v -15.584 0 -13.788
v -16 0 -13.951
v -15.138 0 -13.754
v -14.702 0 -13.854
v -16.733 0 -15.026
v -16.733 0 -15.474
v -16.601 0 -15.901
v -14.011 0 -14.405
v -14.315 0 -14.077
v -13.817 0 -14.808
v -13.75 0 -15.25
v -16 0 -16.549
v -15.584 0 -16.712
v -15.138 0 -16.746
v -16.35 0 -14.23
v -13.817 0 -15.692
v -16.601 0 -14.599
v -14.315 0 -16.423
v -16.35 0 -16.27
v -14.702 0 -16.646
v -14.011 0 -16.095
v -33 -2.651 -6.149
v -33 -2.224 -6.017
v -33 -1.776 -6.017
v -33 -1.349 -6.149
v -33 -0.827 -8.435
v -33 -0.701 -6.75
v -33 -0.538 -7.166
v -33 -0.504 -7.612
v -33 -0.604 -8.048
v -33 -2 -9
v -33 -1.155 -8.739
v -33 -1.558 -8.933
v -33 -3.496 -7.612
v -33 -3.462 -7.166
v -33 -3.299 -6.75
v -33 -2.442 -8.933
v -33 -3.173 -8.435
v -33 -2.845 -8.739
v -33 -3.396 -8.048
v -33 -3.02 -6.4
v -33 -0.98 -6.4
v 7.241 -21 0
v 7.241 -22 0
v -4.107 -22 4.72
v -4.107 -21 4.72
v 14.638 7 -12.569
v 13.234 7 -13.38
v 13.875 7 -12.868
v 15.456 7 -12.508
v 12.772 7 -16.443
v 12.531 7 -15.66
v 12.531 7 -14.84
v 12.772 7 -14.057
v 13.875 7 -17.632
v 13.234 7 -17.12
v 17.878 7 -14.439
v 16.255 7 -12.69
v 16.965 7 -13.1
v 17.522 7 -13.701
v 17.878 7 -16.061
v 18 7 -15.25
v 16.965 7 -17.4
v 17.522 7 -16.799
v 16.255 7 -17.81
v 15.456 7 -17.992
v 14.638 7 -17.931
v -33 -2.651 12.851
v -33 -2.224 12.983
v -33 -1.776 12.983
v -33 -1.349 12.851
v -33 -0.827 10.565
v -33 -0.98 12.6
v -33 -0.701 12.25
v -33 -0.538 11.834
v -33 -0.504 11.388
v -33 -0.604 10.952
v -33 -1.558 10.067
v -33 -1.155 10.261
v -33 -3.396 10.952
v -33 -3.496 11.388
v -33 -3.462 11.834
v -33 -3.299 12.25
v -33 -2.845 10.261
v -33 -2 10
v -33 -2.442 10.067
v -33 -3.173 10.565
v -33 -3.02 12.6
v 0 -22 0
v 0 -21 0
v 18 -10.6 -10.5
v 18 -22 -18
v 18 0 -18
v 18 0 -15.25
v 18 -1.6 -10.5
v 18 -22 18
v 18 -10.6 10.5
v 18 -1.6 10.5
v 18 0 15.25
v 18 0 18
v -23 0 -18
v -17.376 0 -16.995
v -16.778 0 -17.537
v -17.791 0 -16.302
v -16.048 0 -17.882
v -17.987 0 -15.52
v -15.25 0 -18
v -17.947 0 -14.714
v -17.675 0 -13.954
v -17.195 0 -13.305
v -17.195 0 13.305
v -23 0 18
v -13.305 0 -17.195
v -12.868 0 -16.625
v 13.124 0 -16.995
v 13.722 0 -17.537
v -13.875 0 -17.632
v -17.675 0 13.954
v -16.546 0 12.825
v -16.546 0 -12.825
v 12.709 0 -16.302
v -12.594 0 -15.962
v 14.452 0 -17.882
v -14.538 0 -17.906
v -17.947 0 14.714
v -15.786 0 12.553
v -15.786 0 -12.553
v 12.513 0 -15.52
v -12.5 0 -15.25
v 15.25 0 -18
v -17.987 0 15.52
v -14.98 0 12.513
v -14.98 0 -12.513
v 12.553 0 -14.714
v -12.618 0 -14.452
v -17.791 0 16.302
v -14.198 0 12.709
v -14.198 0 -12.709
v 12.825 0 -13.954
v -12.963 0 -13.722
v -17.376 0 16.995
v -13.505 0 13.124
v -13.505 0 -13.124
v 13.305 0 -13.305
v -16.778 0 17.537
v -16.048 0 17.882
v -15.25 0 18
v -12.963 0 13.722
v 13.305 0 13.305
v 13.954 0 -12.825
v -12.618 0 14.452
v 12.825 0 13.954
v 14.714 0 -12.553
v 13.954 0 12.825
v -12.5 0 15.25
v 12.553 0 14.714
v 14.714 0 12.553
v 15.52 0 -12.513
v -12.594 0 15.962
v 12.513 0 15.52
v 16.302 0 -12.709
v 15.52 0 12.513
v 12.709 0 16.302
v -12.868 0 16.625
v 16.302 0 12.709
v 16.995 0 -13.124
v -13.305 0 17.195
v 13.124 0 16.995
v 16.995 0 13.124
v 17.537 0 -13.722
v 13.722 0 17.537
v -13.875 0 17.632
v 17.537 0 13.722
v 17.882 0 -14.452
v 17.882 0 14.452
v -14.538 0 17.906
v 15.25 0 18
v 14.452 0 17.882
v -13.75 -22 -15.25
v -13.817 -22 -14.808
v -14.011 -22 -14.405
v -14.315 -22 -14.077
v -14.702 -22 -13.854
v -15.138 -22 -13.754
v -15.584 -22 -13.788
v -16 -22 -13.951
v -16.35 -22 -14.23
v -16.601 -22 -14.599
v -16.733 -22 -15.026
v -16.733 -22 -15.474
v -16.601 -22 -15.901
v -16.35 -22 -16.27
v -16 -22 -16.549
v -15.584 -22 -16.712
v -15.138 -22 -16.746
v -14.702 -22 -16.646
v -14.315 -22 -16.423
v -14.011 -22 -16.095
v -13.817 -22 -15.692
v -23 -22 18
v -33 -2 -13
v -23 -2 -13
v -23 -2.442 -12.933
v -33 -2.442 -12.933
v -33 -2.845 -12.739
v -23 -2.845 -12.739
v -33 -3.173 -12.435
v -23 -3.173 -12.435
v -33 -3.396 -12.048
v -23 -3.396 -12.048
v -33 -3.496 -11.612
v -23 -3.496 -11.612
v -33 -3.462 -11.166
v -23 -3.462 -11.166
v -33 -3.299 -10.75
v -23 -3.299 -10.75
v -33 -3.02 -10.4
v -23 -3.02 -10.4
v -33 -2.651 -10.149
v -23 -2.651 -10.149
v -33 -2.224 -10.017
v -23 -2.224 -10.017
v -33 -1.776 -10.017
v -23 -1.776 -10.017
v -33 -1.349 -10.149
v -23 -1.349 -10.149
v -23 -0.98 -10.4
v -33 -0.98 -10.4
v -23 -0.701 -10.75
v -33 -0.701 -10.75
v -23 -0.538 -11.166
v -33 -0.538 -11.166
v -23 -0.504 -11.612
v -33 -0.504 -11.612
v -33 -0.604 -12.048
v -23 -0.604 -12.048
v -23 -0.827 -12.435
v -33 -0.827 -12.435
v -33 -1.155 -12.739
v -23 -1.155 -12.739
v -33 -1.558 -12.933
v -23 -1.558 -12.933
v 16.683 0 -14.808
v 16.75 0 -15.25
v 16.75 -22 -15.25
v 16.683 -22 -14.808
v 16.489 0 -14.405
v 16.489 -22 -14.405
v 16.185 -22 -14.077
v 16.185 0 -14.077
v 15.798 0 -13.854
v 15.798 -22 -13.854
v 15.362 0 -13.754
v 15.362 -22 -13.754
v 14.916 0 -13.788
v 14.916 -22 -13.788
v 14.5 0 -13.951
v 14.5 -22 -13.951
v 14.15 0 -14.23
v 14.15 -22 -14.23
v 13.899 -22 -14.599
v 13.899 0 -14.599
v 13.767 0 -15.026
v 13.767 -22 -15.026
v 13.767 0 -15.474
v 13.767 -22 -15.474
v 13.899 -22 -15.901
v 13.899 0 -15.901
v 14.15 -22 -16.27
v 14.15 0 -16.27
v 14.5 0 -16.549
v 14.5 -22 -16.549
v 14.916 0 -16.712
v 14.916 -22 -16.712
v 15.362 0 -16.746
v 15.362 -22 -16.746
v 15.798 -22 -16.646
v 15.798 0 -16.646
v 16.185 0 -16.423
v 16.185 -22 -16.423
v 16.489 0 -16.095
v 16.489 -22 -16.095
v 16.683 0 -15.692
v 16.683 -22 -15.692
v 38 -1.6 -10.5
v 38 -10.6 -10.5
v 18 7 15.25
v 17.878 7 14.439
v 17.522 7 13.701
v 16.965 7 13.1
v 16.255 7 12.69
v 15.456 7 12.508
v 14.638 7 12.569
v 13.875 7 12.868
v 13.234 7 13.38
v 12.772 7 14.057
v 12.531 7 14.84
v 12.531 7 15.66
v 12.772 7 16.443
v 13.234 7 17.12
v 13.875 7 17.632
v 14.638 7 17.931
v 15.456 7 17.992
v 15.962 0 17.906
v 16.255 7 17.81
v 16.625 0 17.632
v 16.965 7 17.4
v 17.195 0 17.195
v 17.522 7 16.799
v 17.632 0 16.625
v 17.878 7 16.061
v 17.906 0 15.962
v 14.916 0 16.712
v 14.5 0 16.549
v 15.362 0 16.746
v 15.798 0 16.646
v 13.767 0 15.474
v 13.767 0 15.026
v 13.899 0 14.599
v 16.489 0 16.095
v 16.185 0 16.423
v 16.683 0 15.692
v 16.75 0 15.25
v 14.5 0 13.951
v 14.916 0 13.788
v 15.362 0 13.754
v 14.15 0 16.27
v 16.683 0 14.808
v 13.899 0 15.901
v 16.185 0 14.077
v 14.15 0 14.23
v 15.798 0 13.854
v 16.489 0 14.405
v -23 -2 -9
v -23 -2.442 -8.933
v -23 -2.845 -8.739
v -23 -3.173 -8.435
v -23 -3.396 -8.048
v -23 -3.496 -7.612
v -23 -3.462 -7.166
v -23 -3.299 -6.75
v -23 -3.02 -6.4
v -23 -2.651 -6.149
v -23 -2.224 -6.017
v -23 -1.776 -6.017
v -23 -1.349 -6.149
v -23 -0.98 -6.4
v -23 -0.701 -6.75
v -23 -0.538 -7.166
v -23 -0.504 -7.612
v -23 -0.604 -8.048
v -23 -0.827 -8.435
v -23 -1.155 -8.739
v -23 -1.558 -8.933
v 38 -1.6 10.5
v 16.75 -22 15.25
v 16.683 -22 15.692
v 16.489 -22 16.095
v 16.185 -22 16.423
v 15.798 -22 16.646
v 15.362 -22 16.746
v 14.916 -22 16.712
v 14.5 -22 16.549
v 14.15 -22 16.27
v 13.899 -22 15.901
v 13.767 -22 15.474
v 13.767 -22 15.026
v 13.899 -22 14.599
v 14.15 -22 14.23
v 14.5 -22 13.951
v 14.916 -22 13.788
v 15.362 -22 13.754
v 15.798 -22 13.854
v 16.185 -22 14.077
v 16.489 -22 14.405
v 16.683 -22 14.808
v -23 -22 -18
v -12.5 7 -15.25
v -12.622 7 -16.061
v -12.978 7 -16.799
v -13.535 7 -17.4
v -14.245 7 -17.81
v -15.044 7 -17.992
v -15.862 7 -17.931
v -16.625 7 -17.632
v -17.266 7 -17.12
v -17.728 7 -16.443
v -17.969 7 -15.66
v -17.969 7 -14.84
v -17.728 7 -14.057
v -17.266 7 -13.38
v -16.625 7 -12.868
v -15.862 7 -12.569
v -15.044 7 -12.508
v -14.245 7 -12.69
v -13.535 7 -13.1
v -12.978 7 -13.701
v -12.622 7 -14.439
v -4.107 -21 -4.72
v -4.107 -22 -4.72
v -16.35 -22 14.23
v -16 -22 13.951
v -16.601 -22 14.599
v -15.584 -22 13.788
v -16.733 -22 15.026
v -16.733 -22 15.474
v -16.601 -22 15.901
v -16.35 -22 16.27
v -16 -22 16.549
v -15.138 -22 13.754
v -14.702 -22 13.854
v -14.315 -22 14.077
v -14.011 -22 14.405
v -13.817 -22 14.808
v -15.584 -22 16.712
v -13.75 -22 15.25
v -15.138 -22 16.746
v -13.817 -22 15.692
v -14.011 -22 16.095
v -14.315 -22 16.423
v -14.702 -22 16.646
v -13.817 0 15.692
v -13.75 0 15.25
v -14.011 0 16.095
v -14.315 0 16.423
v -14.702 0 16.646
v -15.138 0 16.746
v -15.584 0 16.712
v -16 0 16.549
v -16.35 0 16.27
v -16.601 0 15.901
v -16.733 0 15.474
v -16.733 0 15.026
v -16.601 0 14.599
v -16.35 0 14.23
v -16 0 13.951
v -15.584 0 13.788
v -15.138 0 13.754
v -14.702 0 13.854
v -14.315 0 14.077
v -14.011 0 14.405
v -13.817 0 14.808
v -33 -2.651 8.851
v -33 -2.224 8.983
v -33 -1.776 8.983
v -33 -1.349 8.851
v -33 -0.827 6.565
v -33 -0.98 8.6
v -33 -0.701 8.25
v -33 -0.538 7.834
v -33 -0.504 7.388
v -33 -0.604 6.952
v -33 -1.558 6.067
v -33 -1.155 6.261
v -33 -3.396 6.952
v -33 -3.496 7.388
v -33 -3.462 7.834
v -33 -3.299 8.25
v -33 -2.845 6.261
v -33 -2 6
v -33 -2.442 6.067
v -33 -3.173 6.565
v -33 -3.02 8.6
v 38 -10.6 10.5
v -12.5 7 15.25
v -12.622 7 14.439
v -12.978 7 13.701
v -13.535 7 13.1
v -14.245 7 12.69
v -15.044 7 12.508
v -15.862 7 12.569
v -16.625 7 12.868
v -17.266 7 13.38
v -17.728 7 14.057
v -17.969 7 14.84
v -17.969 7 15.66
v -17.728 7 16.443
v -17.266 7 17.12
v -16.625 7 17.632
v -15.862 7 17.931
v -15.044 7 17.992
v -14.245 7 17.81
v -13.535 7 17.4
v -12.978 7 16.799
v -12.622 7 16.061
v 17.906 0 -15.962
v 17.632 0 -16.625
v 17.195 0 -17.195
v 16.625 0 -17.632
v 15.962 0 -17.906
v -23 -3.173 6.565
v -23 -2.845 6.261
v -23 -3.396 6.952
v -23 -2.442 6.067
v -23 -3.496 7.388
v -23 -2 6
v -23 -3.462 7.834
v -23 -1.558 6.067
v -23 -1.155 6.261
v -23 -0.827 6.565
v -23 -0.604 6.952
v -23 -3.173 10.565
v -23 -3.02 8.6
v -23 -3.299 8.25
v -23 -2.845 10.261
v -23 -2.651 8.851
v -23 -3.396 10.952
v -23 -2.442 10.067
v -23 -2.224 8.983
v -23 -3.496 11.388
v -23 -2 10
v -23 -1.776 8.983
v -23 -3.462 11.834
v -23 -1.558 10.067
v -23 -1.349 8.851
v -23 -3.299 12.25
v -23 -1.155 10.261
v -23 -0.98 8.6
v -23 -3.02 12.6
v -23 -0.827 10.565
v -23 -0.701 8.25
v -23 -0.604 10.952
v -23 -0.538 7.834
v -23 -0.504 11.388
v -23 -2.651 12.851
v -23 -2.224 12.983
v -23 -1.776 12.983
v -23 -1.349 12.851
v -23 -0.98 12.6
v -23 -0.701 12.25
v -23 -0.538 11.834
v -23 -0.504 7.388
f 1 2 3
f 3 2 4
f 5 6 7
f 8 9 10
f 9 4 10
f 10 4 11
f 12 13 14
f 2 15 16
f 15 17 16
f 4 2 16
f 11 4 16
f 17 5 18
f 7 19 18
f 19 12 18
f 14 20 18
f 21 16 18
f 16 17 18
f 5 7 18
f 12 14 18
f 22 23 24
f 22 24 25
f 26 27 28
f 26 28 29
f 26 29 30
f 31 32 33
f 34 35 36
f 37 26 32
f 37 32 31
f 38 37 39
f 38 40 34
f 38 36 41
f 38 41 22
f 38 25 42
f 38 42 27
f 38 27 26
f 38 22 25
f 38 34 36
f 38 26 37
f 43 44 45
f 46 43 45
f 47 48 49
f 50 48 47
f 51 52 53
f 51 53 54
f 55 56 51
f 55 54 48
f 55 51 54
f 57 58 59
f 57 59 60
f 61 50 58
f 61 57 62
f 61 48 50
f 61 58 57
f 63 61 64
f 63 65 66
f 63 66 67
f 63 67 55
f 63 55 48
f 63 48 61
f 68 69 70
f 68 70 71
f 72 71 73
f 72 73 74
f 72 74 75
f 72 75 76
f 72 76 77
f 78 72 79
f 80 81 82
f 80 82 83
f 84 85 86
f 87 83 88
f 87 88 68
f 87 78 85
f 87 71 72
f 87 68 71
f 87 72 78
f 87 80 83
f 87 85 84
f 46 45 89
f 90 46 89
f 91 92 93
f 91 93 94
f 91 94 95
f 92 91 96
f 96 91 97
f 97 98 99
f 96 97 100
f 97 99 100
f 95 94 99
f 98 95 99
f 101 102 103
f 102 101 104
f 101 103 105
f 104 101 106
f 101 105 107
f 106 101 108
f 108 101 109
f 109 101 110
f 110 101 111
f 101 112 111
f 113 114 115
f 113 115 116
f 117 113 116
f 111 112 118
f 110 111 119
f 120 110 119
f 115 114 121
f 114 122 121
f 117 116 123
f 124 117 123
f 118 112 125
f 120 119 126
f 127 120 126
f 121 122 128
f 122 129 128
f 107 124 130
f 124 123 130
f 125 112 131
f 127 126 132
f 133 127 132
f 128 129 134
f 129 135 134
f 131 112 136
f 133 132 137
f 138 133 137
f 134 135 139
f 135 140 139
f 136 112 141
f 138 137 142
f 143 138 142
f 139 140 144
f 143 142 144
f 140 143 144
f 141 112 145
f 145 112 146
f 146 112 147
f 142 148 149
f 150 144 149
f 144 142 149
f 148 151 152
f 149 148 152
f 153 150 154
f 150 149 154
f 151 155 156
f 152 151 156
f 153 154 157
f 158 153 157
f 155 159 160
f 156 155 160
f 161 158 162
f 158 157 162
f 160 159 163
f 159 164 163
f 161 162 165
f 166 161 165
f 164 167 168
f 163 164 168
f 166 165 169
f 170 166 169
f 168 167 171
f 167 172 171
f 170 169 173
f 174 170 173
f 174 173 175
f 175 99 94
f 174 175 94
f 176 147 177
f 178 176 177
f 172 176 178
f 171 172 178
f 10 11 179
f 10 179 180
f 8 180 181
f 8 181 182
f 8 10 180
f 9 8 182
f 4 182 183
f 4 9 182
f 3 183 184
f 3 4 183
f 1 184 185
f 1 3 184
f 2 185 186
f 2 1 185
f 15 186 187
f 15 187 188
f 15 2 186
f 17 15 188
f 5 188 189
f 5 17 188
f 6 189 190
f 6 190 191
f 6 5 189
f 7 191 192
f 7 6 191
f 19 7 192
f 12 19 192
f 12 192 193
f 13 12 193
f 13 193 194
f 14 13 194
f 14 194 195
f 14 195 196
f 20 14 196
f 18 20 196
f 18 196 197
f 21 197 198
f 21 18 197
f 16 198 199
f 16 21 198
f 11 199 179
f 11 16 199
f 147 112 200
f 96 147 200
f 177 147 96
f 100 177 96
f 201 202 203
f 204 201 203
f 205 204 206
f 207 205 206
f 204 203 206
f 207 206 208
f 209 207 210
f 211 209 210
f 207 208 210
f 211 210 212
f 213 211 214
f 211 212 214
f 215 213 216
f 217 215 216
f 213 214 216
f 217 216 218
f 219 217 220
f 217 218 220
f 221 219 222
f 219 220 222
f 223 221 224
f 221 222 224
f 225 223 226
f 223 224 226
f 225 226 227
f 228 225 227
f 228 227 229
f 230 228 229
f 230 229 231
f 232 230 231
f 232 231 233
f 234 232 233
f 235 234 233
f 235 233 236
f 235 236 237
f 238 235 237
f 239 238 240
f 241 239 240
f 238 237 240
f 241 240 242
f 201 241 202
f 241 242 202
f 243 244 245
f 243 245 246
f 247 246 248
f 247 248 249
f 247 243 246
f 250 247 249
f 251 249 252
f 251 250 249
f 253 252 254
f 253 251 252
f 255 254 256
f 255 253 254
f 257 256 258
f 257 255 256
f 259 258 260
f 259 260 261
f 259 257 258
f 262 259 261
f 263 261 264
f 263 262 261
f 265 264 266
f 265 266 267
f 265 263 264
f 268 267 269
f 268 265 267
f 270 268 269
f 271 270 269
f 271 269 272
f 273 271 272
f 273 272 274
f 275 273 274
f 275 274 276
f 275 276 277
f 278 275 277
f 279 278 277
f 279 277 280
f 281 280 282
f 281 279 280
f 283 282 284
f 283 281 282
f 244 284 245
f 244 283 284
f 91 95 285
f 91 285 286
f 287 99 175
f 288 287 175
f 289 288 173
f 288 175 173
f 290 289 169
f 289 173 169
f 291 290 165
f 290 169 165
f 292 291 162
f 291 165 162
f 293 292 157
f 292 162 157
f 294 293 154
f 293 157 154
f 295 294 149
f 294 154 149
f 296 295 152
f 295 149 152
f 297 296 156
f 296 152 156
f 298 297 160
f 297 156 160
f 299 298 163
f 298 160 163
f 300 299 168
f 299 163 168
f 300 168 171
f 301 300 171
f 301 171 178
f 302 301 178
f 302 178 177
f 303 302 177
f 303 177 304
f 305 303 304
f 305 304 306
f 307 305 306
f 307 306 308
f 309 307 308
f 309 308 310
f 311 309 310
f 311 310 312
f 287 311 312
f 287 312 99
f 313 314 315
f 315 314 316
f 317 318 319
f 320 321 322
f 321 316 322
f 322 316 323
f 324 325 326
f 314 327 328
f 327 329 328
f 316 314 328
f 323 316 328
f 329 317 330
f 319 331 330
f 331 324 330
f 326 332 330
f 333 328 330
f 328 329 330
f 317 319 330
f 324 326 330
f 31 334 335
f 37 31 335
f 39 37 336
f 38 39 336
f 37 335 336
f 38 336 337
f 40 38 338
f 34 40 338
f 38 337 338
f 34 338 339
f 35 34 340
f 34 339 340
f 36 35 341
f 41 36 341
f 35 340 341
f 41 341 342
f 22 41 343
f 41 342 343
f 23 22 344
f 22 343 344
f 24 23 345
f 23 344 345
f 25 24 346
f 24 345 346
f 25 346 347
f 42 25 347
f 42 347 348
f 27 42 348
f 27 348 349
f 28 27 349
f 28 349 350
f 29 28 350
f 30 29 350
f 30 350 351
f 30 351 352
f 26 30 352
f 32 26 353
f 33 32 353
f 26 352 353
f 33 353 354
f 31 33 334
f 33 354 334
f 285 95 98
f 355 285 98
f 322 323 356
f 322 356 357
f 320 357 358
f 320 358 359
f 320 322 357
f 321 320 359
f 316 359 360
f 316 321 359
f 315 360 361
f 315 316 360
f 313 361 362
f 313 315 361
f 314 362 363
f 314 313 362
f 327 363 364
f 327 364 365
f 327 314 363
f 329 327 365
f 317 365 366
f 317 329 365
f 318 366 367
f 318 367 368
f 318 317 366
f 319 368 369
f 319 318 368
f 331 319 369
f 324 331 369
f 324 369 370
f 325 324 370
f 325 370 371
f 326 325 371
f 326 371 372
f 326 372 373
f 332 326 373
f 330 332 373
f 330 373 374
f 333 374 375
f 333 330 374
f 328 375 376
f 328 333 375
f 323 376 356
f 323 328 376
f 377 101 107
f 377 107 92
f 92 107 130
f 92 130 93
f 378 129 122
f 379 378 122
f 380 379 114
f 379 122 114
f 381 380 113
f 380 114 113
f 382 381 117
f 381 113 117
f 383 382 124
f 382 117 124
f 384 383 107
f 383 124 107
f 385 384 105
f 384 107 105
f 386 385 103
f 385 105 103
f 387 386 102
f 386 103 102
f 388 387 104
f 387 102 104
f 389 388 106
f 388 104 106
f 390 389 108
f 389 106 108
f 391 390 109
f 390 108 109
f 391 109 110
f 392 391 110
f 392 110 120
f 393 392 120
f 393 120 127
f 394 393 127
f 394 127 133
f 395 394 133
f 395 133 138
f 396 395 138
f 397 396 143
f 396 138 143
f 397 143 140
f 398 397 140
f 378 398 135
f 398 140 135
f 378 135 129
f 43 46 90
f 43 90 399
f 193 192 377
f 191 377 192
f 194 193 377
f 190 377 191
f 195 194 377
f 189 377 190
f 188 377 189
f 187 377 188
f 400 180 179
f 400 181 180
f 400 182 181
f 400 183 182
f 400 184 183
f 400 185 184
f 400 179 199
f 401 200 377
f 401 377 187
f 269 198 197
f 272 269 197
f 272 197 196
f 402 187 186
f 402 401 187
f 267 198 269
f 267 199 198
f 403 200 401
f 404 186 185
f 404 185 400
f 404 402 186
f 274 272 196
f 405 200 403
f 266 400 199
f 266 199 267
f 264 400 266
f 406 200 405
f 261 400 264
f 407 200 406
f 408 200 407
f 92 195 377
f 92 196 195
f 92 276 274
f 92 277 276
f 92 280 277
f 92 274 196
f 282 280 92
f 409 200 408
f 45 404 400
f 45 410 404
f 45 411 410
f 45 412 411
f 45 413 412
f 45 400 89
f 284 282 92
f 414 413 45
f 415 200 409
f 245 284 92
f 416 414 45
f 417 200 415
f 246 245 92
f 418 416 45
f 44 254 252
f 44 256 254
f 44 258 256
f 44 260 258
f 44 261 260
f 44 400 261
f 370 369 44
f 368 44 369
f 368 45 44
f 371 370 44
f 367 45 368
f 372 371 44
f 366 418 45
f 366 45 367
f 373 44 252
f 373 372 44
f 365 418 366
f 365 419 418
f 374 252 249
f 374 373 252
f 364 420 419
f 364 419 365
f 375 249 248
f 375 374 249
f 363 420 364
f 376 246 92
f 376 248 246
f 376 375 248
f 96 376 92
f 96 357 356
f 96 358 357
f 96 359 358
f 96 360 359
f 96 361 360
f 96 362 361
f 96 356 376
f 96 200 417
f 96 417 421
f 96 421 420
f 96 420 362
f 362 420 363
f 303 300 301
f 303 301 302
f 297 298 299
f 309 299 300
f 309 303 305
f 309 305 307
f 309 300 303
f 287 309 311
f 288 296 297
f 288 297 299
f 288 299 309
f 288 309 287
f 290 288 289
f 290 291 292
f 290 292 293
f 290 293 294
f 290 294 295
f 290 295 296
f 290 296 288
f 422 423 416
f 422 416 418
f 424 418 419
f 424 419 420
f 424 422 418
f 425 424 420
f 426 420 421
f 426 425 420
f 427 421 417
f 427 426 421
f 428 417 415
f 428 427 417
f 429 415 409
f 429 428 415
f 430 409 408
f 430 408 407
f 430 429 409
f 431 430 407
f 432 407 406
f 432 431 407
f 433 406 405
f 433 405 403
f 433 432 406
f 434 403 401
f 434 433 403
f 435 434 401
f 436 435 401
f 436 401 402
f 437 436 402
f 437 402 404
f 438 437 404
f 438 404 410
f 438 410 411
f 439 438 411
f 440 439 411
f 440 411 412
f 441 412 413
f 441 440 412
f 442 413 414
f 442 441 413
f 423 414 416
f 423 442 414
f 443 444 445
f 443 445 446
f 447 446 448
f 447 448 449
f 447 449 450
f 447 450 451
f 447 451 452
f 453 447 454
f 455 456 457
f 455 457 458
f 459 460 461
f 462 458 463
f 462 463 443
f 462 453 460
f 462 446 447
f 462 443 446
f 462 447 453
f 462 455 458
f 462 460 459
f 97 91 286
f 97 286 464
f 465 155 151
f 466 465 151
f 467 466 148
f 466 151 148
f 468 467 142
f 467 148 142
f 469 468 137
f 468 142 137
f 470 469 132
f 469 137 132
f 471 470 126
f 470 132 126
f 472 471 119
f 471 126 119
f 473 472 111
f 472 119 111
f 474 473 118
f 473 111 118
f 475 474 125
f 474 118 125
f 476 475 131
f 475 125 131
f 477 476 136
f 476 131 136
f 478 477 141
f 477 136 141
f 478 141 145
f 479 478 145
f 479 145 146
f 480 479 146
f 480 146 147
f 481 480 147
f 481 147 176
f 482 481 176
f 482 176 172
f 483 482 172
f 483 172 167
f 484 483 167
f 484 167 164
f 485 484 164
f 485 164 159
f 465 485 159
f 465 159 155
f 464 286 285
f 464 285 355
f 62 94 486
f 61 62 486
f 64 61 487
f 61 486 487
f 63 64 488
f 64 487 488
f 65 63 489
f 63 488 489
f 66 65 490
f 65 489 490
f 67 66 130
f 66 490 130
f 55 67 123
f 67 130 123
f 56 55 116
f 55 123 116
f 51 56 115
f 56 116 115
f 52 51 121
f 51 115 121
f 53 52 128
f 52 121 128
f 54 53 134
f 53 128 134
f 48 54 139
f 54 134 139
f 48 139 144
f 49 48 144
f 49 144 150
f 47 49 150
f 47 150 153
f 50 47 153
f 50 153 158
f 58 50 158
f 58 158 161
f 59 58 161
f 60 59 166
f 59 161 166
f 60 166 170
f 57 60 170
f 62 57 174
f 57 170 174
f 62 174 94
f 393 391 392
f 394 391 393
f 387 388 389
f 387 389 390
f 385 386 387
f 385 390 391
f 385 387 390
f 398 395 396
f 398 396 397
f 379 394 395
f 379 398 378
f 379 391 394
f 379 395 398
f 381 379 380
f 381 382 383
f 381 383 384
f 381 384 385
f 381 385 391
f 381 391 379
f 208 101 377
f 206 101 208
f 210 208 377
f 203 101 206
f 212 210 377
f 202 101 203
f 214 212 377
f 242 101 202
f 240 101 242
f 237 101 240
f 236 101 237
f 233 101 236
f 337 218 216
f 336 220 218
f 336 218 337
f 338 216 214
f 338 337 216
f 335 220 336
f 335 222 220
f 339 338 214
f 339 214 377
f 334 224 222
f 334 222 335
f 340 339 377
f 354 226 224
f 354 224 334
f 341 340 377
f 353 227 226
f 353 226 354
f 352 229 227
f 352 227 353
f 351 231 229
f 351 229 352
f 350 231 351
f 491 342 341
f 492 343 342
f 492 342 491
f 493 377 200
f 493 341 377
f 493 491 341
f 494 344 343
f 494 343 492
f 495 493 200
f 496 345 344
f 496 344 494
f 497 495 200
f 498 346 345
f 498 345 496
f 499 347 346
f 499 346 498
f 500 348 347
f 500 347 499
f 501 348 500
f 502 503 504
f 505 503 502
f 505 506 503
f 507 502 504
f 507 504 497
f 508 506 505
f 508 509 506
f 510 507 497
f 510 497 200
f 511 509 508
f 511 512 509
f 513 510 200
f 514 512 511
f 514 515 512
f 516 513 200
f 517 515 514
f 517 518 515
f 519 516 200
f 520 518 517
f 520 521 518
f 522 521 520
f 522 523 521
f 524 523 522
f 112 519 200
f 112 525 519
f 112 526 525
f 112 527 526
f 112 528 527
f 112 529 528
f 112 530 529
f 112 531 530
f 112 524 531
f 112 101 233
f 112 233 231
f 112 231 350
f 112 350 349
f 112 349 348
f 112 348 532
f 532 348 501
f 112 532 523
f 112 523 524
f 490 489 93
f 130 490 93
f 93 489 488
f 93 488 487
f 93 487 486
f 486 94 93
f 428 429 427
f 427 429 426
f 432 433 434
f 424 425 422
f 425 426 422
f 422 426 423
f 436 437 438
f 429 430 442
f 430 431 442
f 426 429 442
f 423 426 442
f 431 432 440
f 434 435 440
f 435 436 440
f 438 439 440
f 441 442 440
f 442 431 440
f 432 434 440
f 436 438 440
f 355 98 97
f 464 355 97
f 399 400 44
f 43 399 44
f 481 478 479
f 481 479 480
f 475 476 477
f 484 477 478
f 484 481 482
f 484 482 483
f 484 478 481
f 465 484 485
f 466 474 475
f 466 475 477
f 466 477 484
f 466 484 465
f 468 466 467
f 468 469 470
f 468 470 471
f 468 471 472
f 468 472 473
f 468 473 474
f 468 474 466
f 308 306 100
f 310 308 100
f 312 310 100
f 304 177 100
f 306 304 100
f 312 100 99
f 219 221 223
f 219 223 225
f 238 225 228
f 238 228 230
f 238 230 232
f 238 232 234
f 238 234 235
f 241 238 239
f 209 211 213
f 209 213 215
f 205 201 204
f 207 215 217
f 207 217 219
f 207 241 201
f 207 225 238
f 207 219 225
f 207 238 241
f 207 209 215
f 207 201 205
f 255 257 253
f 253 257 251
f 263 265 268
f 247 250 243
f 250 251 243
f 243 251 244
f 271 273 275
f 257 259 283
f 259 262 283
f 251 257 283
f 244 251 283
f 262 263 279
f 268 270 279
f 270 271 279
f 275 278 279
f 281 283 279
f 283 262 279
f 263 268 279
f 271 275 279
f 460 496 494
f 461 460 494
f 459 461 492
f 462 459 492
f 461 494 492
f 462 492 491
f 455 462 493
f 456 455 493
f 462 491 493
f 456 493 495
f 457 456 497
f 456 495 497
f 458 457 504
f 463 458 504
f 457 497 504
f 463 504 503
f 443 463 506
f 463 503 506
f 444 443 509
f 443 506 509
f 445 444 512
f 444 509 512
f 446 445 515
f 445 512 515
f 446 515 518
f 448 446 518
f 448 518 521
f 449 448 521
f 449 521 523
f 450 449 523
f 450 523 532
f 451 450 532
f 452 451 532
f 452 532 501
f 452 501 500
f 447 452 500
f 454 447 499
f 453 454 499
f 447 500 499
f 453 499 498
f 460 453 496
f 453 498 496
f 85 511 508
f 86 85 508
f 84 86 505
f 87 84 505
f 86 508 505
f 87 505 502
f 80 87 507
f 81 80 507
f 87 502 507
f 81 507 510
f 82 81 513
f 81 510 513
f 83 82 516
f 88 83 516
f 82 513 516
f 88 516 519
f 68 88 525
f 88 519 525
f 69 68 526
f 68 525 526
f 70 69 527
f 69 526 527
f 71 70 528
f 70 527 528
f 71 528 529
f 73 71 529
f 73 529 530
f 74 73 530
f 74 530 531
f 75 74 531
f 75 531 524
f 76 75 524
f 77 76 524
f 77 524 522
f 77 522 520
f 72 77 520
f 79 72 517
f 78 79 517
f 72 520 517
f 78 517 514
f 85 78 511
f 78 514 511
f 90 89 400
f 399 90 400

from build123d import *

# Parameters (mm, degrees)
SKETCH040_W     = 41
SKETCH040_H     = 36
SKETCH040_R     = 1.5
PAD014_DEPTH    = 22
SKETCH041_R     = 2.75
PAD015_DEPTH    = 7
SKETCH042_W     = 21
SKETCH042_H     = 9
PAD016_DEPTH    = 20
SKETCH043_R     = 1.5
PAD017_DEPTH    = 10
POCKET016_DEPTH = 1


with BuildPart() as part:
    # Sketch040 → Pad014 (new body)
    with BuildSketch(Plane.XZ):
        with Locations((-2.5, 0)):
            Rectangle(SKETCH040_W, SKETCH040_H)
        with Locations((15.25, 15.25)):
            Circle(SKETCH040_R, mode=Mode.SUBTRACT)
        with Locations((15.25, -15.25)):
            Circle(SKETCH040_R, mode=Mode.SUBTRACT)
        with Locations((-15.25, -15.25)):
            Circle(SKETCH040_R, mode=Mode.SUBTRACT)
        with Locations((-15.25, 15.25)):
            Circle(SKETCH040_R, mode=Mode.SUBTRACT)
    extrude(amount=PAD014_DEPTH)

    # Sketch041 (on Face9 of Pad014) → Pad015 (join)
    with BuildSketch(Plane(origin=(0, 0, 0), x_dir=(1, 0, 0), z_dir=(0, 1, 0))):
        with Locations((15.25, 15.25)):
            Circle(SKETCH041_R)
        with Locations((15.25, -15.25)):
            Circle(SKETCH041_R)
        with Locations((-15.25, -15.25)):
            Circle(SKETCH041_R)
        with Locations((-15.25, 15.25)):
            Circle(SKETCH041_R)
    extrude(amount=PAD015_DEPTH)

    # Sketch042 (on Face3 of Pad015) → Pad016 (join)
    with BuildSketch(Plane(origin=(18, 0, 0), x_dir=(0, 0, 1), z_dir=(1, 0, 0))):
        with Locations((0, 6.1)):
            Rectangle(SKETCH042_W, SKETCH042_H)
    extrude(amount=PAD016_DEPTH)

    # Sketch043 (on Face2 of Pad016) → Pad017 (join)
    with BuildSketch(Plane(origin=(-23, 0, 0), x_dir=(0, 0, -1), z_dir=(-1, 0, 0))):
        with Locations((-11.5, 2)):
            Circle(SKETCH043_R)
        with Locations((-7.5, 2)):
            Circle(SKETCH043_R)
        with Locations((7.5, 2)):
            Circle(SKETCH043_R)
        with Locations((11.5, 2)):
            Circle(SKETCH043_R)
    extrude(amount=PAD017_DEPTH)

    # Sketch044 (on Face6 of Pad017) → Pocket016 (cut)
    with BuildSketch(Plane.XZ.offset(22)):
        Polygon((-4.106884, -4.719943), (7.24077, 0), (-4.106884, 4.719943), (0, 0), align=None)
    extrude(amount=-POCKET016_DEPTH, mode=Mode.SUBTRACT)


solid = part.part
